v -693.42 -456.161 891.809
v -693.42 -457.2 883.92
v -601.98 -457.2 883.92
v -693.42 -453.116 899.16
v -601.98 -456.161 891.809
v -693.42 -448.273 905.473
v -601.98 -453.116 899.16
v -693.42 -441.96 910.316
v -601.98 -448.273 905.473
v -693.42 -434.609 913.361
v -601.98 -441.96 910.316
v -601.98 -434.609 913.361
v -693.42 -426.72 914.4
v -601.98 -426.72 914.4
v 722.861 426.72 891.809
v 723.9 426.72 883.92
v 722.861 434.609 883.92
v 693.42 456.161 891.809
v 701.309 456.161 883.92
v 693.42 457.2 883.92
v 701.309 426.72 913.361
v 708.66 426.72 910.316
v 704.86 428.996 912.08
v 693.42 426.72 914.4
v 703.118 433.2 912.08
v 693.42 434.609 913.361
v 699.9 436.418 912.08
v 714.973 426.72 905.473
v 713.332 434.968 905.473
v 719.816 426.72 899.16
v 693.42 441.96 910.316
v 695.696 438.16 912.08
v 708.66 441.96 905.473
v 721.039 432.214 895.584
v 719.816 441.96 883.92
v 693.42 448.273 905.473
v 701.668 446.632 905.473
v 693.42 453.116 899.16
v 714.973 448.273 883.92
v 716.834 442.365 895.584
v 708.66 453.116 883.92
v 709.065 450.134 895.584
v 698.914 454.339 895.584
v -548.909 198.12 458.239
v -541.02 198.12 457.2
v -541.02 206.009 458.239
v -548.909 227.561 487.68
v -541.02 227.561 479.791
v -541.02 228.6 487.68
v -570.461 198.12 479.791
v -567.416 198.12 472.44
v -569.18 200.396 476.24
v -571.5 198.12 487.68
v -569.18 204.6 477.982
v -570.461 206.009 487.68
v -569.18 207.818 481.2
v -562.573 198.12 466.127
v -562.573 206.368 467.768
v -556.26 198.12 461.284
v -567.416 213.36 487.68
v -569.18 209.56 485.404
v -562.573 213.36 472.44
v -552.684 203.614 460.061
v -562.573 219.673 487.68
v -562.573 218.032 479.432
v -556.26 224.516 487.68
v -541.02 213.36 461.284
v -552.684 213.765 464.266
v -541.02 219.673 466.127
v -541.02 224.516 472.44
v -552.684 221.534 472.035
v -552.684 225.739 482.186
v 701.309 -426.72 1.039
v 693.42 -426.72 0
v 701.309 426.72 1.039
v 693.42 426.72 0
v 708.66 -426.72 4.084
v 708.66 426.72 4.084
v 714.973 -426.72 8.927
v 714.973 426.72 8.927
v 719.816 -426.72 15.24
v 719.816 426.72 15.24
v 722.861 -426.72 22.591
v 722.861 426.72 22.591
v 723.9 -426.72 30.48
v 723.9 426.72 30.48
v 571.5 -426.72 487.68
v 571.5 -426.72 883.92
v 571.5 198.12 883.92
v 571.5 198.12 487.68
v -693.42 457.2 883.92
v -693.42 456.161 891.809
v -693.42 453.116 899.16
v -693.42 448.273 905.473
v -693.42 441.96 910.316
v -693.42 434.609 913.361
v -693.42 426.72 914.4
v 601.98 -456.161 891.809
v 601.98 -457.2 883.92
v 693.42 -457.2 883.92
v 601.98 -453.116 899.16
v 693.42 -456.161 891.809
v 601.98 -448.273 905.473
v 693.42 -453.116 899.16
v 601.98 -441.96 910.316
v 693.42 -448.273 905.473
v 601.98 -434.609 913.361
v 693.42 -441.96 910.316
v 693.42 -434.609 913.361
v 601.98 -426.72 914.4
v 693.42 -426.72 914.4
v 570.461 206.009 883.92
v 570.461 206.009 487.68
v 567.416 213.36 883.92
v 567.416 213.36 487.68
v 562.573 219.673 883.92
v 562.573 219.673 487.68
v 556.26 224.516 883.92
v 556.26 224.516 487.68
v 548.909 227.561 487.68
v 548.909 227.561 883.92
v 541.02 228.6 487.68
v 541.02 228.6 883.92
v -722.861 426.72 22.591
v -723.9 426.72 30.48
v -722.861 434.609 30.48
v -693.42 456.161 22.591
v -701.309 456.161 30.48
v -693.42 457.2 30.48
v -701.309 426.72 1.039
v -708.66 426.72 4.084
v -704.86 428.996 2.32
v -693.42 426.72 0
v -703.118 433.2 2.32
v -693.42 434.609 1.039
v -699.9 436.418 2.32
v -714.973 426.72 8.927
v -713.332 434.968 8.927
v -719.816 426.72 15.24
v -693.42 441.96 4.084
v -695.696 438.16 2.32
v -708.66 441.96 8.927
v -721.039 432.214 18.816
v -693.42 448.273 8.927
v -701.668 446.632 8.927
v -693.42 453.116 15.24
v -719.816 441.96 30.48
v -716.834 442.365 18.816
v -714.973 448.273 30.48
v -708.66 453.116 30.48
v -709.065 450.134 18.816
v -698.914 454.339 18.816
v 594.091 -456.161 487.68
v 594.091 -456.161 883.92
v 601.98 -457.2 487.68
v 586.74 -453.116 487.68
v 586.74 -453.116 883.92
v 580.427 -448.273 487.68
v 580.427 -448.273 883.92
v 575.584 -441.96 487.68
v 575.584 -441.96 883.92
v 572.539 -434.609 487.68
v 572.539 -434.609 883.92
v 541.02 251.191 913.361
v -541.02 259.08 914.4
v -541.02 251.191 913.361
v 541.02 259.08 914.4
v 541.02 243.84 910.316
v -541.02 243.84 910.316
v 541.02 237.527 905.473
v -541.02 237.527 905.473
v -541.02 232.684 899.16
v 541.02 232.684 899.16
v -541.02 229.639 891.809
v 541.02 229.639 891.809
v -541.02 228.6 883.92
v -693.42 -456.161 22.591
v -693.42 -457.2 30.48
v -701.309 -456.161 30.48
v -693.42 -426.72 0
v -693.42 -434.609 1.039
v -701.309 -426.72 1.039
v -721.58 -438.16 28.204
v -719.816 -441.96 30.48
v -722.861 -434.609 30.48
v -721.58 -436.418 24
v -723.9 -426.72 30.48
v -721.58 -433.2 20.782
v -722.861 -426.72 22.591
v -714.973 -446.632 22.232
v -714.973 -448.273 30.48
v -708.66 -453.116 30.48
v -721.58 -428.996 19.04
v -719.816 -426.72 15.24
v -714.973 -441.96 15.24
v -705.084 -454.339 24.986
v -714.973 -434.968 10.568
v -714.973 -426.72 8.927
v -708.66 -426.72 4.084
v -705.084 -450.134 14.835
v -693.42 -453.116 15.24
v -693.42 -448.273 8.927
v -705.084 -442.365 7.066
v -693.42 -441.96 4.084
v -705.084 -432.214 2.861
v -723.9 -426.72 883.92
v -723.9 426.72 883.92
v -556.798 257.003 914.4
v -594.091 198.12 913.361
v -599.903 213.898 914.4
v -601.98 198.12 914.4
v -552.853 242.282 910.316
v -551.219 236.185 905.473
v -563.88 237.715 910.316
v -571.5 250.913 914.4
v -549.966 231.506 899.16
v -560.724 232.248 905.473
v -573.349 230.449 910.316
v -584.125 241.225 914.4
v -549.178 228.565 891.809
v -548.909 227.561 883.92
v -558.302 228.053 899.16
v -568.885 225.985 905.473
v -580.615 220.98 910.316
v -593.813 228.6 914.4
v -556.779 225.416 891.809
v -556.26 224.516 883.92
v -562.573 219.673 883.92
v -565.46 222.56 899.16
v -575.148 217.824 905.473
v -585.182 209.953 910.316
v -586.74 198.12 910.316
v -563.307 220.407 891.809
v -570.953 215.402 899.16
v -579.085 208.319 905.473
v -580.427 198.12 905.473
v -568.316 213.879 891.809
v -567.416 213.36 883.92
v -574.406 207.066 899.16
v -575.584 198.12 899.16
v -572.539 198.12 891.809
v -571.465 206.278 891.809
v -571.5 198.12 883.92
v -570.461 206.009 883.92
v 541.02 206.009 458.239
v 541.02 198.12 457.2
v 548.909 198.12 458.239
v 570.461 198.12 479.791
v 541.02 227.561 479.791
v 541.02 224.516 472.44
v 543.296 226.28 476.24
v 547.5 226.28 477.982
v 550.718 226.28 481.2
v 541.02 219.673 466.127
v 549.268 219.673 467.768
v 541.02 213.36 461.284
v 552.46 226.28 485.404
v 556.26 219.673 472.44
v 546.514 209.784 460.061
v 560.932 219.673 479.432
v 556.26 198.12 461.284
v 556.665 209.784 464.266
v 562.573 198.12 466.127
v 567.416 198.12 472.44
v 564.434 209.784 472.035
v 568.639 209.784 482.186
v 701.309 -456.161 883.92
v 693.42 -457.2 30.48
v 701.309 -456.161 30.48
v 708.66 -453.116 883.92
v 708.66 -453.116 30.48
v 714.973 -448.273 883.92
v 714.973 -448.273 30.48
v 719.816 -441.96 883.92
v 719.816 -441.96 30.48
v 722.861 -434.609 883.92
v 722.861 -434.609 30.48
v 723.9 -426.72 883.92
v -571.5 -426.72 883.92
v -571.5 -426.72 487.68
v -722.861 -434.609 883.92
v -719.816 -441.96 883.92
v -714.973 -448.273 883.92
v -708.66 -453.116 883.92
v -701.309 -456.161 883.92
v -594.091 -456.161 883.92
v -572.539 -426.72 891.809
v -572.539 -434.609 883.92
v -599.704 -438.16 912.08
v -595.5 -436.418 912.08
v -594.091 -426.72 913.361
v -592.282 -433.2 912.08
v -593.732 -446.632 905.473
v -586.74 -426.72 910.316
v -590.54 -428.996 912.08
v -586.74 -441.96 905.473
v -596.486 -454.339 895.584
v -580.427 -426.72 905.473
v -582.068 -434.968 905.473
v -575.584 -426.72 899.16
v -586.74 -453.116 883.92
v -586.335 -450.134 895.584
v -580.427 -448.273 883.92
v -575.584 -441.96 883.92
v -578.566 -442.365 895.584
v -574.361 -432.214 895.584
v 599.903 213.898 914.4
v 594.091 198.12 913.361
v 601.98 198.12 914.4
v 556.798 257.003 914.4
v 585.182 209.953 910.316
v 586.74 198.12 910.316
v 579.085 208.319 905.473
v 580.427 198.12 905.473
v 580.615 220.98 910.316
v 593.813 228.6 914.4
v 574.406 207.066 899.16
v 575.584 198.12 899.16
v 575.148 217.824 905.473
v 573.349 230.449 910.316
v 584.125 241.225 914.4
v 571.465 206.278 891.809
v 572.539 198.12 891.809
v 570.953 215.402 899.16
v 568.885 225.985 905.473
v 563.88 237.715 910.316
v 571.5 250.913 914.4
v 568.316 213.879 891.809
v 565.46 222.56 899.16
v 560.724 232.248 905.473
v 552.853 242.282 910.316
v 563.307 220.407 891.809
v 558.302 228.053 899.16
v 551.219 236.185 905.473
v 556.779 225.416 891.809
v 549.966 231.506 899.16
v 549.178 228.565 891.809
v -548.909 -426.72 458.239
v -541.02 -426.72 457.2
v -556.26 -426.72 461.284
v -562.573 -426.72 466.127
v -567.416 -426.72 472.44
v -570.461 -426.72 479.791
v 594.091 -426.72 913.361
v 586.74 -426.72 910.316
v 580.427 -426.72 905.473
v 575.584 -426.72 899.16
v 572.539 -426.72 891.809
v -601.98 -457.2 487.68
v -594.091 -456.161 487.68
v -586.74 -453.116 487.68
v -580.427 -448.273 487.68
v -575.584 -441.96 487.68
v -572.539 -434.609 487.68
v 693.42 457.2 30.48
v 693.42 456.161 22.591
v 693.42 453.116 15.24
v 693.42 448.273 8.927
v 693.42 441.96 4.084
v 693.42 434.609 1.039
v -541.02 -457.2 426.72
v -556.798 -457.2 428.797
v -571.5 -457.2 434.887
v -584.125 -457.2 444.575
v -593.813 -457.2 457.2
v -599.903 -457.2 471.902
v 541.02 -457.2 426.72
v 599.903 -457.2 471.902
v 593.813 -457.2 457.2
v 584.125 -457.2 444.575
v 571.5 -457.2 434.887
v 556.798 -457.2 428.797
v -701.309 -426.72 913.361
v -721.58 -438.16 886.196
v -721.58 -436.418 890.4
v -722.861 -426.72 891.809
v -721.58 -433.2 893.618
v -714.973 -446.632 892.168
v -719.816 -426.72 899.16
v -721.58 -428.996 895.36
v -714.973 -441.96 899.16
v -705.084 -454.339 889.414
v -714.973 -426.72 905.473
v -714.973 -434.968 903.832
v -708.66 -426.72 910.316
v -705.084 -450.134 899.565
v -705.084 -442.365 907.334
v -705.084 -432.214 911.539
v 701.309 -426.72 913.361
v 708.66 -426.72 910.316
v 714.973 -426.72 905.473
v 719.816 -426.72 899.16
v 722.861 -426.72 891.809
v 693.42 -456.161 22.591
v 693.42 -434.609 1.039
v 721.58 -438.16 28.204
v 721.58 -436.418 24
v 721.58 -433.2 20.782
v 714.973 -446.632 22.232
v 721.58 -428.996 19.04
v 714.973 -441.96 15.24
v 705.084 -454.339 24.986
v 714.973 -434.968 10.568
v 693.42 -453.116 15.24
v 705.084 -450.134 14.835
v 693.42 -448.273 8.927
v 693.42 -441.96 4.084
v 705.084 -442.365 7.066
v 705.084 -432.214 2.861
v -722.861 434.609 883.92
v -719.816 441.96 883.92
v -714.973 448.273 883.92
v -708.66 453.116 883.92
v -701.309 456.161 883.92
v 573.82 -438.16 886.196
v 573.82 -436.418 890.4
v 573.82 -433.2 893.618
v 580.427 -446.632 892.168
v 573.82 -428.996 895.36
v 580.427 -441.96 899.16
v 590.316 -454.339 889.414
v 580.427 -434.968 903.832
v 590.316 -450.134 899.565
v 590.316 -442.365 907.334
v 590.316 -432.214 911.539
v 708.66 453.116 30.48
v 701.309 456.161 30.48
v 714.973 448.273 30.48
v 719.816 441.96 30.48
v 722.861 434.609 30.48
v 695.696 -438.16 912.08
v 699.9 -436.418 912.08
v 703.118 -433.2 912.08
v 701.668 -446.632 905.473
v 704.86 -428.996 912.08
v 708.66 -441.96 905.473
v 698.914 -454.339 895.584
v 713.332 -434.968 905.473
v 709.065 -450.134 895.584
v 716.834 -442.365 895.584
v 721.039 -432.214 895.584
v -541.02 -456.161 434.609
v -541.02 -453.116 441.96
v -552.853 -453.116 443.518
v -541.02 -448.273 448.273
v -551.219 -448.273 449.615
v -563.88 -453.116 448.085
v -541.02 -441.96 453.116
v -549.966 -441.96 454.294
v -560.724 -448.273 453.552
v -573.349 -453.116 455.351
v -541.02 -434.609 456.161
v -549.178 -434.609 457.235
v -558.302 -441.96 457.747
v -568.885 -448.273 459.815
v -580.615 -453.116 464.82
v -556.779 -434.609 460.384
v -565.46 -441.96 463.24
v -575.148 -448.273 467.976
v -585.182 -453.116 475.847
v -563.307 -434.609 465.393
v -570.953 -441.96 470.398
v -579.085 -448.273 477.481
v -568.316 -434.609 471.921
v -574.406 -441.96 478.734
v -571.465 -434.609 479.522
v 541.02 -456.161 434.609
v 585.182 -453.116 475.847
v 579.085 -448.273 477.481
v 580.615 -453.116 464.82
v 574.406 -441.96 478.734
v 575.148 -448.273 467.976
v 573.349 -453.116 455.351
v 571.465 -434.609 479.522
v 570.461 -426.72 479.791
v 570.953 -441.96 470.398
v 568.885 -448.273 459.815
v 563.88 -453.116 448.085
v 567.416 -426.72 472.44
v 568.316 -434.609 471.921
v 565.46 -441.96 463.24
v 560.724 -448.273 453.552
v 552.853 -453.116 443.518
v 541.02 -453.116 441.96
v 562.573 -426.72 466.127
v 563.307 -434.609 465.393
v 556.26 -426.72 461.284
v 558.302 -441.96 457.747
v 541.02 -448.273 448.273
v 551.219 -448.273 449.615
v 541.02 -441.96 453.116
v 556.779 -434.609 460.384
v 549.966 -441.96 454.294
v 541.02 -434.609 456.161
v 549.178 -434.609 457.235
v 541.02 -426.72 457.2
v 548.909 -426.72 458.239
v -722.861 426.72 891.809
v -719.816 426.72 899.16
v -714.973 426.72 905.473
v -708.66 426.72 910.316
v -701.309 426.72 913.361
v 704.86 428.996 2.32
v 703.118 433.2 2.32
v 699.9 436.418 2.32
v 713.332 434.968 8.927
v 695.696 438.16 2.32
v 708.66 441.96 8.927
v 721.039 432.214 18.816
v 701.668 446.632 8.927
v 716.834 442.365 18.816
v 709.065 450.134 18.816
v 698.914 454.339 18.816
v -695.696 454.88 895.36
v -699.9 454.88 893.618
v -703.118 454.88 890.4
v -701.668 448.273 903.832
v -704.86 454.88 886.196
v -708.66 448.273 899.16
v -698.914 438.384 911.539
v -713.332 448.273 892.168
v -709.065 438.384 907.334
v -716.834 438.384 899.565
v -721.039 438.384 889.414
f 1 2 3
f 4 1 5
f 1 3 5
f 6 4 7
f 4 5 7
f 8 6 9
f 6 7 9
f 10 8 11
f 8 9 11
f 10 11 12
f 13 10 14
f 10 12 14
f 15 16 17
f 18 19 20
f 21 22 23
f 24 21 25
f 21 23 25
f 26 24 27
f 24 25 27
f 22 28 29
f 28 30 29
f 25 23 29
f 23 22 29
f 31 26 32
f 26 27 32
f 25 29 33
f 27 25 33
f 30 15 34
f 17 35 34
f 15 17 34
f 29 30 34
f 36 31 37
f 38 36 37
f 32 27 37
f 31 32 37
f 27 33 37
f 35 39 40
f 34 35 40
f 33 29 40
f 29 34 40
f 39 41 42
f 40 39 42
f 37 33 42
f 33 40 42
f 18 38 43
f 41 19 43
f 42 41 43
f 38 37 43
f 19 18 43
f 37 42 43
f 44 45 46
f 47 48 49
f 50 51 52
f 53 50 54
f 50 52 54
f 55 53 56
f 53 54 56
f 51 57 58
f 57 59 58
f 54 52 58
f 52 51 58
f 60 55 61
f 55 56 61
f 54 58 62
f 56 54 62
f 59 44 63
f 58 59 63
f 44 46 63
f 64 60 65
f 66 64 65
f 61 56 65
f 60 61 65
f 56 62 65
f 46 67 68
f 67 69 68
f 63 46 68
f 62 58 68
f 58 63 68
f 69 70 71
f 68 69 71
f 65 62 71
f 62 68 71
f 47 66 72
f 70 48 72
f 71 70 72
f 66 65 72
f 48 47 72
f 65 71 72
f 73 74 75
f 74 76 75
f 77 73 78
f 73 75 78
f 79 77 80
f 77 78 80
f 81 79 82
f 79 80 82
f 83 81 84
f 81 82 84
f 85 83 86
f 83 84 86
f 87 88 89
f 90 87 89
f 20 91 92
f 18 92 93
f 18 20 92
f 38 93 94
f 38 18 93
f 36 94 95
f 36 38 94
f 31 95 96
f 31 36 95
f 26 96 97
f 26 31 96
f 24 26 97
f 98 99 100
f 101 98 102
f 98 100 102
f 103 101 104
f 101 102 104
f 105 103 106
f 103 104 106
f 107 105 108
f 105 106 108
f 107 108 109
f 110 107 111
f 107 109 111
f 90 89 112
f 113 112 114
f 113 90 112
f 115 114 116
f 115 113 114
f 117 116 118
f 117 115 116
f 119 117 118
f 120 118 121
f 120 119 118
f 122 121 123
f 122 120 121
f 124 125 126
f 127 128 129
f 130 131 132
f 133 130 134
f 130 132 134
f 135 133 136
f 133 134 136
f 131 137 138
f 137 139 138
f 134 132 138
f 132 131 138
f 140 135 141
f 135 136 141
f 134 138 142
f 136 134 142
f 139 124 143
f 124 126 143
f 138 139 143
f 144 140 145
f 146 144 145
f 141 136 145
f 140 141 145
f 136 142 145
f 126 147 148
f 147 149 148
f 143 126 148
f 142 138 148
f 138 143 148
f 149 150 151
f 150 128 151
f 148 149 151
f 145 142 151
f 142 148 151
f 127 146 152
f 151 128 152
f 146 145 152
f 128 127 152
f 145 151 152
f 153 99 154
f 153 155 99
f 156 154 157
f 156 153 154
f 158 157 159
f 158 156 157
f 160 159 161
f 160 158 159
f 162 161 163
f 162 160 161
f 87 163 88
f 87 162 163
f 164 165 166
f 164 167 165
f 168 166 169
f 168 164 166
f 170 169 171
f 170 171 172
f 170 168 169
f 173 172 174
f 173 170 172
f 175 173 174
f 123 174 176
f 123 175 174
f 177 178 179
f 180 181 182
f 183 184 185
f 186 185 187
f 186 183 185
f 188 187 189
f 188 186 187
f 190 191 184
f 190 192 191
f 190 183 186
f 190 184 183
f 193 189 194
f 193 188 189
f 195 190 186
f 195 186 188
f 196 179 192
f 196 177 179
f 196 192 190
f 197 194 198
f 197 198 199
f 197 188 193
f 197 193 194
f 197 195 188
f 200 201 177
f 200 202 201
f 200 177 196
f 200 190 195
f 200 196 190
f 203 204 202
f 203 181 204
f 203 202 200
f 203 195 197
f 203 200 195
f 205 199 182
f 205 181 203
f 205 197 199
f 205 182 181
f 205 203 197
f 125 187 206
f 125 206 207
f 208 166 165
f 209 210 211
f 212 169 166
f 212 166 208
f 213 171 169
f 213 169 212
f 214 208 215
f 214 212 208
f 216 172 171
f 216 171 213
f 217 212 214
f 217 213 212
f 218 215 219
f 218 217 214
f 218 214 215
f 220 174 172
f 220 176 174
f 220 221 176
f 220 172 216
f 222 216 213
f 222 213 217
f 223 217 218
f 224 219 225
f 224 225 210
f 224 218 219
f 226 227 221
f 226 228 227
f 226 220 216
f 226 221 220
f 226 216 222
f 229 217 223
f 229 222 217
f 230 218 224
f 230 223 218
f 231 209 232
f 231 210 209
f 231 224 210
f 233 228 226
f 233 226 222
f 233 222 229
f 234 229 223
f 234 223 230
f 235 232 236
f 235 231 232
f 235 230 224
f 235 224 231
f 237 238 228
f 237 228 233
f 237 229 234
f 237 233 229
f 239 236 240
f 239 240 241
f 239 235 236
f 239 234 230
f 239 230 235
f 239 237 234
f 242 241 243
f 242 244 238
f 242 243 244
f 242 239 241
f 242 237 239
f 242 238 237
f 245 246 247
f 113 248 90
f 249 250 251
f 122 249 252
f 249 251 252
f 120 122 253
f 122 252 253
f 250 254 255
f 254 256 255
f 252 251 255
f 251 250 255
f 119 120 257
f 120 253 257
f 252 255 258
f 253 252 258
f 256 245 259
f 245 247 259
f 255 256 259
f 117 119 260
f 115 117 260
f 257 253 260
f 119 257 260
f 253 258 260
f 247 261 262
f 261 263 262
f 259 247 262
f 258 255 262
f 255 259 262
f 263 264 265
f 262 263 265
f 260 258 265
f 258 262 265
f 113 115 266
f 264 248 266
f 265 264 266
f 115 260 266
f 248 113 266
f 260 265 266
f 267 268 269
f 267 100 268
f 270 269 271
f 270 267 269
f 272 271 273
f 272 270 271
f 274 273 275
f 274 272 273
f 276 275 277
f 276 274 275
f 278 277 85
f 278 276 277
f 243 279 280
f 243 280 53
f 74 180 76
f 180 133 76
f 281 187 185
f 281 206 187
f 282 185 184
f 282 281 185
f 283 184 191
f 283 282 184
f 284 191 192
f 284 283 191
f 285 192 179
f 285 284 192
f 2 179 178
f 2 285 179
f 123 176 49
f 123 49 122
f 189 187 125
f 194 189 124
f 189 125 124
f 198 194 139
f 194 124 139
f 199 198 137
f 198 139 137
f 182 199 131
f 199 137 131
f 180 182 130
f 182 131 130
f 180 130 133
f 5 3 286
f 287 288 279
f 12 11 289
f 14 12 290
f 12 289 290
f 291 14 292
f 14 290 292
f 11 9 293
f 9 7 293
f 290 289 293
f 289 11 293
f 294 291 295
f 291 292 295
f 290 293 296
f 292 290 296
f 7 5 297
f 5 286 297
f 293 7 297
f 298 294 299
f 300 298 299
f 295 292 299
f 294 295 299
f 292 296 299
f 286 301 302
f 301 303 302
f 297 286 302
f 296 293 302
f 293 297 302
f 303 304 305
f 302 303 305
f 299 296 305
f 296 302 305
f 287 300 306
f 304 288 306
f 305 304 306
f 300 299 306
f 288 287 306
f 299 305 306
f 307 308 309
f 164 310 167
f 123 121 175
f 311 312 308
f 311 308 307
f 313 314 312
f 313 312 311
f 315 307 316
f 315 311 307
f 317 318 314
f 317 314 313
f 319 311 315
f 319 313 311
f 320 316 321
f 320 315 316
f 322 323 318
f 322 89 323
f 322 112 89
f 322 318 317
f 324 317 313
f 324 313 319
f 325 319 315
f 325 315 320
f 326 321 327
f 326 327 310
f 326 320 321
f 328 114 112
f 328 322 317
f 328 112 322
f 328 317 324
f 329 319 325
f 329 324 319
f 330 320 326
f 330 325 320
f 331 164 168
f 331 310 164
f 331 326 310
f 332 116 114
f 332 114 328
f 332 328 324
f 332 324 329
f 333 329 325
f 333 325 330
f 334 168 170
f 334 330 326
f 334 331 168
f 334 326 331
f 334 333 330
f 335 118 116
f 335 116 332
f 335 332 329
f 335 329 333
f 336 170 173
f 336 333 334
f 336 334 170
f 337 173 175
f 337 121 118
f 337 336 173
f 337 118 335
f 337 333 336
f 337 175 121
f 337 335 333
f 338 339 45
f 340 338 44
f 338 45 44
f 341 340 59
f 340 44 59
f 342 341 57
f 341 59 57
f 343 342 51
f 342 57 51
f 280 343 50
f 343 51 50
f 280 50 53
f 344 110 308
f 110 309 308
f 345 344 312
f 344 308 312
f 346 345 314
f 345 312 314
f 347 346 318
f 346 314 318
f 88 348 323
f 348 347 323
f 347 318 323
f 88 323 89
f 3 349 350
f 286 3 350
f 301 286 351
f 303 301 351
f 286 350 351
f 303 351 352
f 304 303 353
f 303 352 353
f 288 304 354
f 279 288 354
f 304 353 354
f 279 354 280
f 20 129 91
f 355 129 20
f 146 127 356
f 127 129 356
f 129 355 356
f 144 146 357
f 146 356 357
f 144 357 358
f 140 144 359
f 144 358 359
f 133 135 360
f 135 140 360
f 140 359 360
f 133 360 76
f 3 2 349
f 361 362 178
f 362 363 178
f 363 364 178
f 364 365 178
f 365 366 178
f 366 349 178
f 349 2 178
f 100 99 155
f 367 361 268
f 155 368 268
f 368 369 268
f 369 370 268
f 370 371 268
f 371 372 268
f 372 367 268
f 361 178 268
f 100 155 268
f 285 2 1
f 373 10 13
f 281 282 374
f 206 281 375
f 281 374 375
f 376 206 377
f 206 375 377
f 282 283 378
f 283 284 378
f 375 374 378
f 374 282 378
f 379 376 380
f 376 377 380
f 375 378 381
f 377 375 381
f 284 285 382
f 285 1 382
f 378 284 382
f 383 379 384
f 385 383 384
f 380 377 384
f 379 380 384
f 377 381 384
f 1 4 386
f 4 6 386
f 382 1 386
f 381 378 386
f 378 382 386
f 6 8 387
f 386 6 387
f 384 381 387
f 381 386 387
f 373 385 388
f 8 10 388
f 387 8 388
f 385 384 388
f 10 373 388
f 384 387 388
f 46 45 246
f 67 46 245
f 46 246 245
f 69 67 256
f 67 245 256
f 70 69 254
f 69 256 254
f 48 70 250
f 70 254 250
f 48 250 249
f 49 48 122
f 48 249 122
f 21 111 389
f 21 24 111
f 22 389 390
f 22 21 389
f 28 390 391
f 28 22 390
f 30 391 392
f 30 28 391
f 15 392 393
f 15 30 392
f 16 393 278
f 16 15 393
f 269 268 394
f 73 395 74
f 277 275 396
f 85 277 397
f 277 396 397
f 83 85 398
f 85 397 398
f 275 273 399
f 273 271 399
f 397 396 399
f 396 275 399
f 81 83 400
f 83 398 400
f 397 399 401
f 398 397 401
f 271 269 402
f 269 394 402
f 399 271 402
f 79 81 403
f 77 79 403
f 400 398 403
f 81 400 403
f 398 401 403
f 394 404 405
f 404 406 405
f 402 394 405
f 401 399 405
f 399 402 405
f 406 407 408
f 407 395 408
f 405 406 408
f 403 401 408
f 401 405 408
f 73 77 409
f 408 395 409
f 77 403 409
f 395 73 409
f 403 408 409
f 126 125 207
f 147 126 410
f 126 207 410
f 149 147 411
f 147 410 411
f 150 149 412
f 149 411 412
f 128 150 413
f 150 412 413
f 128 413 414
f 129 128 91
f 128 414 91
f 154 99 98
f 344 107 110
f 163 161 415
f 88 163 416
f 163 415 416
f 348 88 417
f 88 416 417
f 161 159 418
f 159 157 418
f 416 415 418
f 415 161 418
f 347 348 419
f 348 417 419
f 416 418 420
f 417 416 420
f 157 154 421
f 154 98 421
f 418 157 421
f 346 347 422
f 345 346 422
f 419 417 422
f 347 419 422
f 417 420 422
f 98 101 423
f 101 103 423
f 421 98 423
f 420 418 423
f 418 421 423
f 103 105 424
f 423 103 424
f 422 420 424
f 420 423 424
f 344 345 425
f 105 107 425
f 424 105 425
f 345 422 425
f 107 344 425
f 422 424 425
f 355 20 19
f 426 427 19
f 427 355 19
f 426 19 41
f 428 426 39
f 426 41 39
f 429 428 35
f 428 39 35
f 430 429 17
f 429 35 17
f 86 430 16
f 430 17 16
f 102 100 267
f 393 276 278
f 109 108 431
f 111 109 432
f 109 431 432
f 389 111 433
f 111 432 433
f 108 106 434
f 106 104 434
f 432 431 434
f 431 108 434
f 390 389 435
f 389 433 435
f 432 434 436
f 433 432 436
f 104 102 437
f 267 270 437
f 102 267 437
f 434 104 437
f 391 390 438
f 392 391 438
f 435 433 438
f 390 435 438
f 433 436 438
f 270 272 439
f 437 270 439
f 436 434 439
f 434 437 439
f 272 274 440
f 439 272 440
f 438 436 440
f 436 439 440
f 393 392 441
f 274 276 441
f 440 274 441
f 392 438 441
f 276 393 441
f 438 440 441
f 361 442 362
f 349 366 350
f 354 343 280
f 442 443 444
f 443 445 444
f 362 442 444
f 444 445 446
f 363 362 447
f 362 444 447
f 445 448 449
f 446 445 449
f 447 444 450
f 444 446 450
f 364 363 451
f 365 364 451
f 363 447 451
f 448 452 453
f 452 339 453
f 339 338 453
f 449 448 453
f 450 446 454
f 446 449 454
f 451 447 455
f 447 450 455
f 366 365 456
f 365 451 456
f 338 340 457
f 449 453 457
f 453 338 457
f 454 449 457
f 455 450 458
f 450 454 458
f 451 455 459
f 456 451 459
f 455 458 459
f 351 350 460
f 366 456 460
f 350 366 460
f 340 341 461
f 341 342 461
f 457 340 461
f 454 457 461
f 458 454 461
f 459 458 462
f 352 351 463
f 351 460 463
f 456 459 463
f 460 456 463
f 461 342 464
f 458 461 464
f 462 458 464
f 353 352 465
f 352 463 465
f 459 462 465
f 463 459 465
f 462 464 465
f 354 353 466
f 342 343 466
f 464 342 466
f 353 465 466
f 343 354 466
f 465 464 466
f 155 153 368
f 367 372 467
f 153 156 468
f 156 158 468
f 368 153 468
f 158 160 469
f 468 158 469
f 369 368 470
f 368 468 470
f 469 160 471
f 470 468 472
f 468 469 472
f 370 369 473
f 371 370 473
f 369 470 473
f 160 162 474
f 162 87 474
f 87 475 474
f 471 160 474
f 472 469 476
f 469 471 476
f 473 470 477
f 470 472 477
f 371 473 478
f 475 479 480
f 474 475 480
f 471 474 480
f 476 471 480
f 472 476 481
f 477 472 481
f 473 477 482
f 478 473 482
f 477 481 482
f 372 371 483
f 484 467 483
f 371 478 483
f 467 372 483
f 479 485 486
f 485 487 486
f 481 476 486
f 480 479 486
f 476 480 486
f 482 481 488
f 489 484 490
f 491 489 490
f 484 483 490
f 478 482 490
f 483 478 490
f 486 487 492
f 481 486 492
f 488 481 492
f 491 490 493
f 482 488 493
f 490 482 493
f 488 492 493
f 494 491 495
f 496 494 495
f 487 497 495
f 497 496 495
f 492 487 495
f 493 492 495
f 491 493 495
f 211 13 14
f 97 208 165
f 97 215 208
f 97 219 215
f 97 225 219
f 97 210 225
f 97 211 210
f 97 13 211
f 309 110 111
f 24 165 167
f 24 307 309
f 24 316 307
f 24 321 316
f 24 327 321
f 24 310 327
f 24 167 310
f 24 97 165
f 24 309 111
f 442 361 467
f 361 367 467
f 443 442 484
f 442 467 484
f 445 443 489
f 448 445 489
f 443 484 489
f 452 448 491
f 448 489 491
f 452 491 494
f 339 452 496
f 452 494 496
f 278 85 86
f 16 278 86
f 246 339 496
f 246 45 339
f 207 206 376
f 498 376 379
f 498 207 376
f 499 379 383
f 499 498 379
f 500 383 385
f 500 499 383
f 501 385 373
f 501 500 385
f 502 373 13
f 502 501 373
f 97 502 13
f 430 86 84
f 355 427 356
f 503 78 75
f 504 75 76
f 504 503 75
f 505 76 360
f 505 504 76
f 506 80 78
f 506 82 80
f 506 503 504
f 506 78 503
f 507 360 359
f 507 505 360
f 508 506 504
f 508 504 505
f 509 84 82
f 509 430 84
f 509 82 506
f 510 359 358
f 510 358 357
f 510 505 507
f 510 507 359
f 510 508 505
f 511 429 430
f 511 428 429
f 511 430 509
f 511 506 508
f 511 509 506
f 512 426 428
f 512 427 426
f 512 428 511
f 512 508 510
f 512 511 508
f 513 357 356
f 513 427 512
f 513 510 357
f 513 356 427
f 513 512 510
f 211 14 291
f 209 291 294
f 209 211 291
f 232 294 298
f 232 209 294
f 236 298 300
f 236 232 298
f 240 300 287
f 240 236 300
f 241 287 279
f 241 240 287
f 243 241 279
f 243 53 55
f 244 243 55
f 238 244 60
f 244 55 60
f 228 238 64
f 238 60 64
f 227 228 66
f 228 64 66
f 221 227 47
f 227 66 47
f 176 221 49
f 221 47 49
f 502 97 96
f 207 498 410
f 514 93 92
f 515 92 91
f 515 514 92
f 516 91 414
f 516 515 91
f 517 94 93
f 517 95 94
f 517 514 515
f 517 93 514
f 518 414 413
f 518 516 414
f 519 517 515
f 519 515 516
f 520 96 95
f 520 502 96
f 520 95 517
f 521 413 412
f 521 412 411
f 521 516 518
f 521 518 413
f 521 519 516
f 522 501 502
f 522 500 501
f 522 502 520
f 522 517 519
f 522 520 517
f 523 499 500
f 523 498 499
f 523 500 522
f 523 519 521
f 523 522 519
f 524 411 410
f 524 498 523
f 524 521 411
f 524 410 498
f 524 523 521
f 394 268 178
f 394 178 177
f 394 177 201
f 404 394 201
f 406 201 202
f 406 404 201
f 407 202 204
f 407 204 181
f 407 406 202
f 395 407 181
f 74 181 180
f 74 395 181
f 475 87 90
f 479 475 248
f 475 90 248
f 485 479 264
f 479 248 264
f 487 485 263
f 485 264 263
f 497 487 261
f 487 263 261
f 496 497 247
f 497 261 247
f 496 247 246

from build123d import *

# Parameters (mm, degrees)
F0_W     = 1447.8
F0_H     = 914.4
F1_DEPTH = 914.4
F2_W     = 1143
F2_H     = 685.8
F3_DEPTH = 457.2
F4_R     = 30.48


with BuildPart() as f1:
    # F0 (on Top) → F1 (new body)
    with BuildSketch(Plane.XY):
        Rectangle(F0_W, F0_H)
    extrude(amount=F1_DEPTH)

    # F2 (on face) → F3 (cut)
    with BuildSketch(Plane.XY.offset(914.4)):
        with Locations((0, -114.3)):
            Rectangle(F2_W, F2_H)
    extrude(amount=-F3_DEPTH, mode=Mode.SUBTRACT)

    # F4
    f4_edges = [f1.edges().sort_by_distance(p)[0] for p in [
        (0, -457.2, 0),
        (723.9, -457.2, 457.2),
        (647.7, -457.2, 914.4),
        (571.5, -457.2, 685.8),
        (0, -457.2, 457.2),
        (-571.5, -457.2, 685.8),
        (-647.7, -457.2, 914.4),
        (-723.9, -457.2, 457.2),
        (723.9, 457.2, 457.2),
        (723.9, 0, 0),
        (723.9, 0, 914.4),
        (-723.9, 0, 914.4),
        (0, 457.2, 914.4),
        (571.5, -114.3, 914.4),
        (0, 228.6, 914.4),
        (-571.5, -114.3, 914.4),
        (571.5, -114.3, 457.2),
        (0, 228.6, 457.2),
        (-571.5, -114.3, 457.2),
        (571.5, 228.6, 685.8),
        (-571.5, 228.6, 685.8),
        (-723.9, 457.2, 457.2),
        (-723.9, 0, 0),
        (0, 457.2, 0),
    ]]
    fillet(f4_edges, radius=F4_R)


solid = f1.part
